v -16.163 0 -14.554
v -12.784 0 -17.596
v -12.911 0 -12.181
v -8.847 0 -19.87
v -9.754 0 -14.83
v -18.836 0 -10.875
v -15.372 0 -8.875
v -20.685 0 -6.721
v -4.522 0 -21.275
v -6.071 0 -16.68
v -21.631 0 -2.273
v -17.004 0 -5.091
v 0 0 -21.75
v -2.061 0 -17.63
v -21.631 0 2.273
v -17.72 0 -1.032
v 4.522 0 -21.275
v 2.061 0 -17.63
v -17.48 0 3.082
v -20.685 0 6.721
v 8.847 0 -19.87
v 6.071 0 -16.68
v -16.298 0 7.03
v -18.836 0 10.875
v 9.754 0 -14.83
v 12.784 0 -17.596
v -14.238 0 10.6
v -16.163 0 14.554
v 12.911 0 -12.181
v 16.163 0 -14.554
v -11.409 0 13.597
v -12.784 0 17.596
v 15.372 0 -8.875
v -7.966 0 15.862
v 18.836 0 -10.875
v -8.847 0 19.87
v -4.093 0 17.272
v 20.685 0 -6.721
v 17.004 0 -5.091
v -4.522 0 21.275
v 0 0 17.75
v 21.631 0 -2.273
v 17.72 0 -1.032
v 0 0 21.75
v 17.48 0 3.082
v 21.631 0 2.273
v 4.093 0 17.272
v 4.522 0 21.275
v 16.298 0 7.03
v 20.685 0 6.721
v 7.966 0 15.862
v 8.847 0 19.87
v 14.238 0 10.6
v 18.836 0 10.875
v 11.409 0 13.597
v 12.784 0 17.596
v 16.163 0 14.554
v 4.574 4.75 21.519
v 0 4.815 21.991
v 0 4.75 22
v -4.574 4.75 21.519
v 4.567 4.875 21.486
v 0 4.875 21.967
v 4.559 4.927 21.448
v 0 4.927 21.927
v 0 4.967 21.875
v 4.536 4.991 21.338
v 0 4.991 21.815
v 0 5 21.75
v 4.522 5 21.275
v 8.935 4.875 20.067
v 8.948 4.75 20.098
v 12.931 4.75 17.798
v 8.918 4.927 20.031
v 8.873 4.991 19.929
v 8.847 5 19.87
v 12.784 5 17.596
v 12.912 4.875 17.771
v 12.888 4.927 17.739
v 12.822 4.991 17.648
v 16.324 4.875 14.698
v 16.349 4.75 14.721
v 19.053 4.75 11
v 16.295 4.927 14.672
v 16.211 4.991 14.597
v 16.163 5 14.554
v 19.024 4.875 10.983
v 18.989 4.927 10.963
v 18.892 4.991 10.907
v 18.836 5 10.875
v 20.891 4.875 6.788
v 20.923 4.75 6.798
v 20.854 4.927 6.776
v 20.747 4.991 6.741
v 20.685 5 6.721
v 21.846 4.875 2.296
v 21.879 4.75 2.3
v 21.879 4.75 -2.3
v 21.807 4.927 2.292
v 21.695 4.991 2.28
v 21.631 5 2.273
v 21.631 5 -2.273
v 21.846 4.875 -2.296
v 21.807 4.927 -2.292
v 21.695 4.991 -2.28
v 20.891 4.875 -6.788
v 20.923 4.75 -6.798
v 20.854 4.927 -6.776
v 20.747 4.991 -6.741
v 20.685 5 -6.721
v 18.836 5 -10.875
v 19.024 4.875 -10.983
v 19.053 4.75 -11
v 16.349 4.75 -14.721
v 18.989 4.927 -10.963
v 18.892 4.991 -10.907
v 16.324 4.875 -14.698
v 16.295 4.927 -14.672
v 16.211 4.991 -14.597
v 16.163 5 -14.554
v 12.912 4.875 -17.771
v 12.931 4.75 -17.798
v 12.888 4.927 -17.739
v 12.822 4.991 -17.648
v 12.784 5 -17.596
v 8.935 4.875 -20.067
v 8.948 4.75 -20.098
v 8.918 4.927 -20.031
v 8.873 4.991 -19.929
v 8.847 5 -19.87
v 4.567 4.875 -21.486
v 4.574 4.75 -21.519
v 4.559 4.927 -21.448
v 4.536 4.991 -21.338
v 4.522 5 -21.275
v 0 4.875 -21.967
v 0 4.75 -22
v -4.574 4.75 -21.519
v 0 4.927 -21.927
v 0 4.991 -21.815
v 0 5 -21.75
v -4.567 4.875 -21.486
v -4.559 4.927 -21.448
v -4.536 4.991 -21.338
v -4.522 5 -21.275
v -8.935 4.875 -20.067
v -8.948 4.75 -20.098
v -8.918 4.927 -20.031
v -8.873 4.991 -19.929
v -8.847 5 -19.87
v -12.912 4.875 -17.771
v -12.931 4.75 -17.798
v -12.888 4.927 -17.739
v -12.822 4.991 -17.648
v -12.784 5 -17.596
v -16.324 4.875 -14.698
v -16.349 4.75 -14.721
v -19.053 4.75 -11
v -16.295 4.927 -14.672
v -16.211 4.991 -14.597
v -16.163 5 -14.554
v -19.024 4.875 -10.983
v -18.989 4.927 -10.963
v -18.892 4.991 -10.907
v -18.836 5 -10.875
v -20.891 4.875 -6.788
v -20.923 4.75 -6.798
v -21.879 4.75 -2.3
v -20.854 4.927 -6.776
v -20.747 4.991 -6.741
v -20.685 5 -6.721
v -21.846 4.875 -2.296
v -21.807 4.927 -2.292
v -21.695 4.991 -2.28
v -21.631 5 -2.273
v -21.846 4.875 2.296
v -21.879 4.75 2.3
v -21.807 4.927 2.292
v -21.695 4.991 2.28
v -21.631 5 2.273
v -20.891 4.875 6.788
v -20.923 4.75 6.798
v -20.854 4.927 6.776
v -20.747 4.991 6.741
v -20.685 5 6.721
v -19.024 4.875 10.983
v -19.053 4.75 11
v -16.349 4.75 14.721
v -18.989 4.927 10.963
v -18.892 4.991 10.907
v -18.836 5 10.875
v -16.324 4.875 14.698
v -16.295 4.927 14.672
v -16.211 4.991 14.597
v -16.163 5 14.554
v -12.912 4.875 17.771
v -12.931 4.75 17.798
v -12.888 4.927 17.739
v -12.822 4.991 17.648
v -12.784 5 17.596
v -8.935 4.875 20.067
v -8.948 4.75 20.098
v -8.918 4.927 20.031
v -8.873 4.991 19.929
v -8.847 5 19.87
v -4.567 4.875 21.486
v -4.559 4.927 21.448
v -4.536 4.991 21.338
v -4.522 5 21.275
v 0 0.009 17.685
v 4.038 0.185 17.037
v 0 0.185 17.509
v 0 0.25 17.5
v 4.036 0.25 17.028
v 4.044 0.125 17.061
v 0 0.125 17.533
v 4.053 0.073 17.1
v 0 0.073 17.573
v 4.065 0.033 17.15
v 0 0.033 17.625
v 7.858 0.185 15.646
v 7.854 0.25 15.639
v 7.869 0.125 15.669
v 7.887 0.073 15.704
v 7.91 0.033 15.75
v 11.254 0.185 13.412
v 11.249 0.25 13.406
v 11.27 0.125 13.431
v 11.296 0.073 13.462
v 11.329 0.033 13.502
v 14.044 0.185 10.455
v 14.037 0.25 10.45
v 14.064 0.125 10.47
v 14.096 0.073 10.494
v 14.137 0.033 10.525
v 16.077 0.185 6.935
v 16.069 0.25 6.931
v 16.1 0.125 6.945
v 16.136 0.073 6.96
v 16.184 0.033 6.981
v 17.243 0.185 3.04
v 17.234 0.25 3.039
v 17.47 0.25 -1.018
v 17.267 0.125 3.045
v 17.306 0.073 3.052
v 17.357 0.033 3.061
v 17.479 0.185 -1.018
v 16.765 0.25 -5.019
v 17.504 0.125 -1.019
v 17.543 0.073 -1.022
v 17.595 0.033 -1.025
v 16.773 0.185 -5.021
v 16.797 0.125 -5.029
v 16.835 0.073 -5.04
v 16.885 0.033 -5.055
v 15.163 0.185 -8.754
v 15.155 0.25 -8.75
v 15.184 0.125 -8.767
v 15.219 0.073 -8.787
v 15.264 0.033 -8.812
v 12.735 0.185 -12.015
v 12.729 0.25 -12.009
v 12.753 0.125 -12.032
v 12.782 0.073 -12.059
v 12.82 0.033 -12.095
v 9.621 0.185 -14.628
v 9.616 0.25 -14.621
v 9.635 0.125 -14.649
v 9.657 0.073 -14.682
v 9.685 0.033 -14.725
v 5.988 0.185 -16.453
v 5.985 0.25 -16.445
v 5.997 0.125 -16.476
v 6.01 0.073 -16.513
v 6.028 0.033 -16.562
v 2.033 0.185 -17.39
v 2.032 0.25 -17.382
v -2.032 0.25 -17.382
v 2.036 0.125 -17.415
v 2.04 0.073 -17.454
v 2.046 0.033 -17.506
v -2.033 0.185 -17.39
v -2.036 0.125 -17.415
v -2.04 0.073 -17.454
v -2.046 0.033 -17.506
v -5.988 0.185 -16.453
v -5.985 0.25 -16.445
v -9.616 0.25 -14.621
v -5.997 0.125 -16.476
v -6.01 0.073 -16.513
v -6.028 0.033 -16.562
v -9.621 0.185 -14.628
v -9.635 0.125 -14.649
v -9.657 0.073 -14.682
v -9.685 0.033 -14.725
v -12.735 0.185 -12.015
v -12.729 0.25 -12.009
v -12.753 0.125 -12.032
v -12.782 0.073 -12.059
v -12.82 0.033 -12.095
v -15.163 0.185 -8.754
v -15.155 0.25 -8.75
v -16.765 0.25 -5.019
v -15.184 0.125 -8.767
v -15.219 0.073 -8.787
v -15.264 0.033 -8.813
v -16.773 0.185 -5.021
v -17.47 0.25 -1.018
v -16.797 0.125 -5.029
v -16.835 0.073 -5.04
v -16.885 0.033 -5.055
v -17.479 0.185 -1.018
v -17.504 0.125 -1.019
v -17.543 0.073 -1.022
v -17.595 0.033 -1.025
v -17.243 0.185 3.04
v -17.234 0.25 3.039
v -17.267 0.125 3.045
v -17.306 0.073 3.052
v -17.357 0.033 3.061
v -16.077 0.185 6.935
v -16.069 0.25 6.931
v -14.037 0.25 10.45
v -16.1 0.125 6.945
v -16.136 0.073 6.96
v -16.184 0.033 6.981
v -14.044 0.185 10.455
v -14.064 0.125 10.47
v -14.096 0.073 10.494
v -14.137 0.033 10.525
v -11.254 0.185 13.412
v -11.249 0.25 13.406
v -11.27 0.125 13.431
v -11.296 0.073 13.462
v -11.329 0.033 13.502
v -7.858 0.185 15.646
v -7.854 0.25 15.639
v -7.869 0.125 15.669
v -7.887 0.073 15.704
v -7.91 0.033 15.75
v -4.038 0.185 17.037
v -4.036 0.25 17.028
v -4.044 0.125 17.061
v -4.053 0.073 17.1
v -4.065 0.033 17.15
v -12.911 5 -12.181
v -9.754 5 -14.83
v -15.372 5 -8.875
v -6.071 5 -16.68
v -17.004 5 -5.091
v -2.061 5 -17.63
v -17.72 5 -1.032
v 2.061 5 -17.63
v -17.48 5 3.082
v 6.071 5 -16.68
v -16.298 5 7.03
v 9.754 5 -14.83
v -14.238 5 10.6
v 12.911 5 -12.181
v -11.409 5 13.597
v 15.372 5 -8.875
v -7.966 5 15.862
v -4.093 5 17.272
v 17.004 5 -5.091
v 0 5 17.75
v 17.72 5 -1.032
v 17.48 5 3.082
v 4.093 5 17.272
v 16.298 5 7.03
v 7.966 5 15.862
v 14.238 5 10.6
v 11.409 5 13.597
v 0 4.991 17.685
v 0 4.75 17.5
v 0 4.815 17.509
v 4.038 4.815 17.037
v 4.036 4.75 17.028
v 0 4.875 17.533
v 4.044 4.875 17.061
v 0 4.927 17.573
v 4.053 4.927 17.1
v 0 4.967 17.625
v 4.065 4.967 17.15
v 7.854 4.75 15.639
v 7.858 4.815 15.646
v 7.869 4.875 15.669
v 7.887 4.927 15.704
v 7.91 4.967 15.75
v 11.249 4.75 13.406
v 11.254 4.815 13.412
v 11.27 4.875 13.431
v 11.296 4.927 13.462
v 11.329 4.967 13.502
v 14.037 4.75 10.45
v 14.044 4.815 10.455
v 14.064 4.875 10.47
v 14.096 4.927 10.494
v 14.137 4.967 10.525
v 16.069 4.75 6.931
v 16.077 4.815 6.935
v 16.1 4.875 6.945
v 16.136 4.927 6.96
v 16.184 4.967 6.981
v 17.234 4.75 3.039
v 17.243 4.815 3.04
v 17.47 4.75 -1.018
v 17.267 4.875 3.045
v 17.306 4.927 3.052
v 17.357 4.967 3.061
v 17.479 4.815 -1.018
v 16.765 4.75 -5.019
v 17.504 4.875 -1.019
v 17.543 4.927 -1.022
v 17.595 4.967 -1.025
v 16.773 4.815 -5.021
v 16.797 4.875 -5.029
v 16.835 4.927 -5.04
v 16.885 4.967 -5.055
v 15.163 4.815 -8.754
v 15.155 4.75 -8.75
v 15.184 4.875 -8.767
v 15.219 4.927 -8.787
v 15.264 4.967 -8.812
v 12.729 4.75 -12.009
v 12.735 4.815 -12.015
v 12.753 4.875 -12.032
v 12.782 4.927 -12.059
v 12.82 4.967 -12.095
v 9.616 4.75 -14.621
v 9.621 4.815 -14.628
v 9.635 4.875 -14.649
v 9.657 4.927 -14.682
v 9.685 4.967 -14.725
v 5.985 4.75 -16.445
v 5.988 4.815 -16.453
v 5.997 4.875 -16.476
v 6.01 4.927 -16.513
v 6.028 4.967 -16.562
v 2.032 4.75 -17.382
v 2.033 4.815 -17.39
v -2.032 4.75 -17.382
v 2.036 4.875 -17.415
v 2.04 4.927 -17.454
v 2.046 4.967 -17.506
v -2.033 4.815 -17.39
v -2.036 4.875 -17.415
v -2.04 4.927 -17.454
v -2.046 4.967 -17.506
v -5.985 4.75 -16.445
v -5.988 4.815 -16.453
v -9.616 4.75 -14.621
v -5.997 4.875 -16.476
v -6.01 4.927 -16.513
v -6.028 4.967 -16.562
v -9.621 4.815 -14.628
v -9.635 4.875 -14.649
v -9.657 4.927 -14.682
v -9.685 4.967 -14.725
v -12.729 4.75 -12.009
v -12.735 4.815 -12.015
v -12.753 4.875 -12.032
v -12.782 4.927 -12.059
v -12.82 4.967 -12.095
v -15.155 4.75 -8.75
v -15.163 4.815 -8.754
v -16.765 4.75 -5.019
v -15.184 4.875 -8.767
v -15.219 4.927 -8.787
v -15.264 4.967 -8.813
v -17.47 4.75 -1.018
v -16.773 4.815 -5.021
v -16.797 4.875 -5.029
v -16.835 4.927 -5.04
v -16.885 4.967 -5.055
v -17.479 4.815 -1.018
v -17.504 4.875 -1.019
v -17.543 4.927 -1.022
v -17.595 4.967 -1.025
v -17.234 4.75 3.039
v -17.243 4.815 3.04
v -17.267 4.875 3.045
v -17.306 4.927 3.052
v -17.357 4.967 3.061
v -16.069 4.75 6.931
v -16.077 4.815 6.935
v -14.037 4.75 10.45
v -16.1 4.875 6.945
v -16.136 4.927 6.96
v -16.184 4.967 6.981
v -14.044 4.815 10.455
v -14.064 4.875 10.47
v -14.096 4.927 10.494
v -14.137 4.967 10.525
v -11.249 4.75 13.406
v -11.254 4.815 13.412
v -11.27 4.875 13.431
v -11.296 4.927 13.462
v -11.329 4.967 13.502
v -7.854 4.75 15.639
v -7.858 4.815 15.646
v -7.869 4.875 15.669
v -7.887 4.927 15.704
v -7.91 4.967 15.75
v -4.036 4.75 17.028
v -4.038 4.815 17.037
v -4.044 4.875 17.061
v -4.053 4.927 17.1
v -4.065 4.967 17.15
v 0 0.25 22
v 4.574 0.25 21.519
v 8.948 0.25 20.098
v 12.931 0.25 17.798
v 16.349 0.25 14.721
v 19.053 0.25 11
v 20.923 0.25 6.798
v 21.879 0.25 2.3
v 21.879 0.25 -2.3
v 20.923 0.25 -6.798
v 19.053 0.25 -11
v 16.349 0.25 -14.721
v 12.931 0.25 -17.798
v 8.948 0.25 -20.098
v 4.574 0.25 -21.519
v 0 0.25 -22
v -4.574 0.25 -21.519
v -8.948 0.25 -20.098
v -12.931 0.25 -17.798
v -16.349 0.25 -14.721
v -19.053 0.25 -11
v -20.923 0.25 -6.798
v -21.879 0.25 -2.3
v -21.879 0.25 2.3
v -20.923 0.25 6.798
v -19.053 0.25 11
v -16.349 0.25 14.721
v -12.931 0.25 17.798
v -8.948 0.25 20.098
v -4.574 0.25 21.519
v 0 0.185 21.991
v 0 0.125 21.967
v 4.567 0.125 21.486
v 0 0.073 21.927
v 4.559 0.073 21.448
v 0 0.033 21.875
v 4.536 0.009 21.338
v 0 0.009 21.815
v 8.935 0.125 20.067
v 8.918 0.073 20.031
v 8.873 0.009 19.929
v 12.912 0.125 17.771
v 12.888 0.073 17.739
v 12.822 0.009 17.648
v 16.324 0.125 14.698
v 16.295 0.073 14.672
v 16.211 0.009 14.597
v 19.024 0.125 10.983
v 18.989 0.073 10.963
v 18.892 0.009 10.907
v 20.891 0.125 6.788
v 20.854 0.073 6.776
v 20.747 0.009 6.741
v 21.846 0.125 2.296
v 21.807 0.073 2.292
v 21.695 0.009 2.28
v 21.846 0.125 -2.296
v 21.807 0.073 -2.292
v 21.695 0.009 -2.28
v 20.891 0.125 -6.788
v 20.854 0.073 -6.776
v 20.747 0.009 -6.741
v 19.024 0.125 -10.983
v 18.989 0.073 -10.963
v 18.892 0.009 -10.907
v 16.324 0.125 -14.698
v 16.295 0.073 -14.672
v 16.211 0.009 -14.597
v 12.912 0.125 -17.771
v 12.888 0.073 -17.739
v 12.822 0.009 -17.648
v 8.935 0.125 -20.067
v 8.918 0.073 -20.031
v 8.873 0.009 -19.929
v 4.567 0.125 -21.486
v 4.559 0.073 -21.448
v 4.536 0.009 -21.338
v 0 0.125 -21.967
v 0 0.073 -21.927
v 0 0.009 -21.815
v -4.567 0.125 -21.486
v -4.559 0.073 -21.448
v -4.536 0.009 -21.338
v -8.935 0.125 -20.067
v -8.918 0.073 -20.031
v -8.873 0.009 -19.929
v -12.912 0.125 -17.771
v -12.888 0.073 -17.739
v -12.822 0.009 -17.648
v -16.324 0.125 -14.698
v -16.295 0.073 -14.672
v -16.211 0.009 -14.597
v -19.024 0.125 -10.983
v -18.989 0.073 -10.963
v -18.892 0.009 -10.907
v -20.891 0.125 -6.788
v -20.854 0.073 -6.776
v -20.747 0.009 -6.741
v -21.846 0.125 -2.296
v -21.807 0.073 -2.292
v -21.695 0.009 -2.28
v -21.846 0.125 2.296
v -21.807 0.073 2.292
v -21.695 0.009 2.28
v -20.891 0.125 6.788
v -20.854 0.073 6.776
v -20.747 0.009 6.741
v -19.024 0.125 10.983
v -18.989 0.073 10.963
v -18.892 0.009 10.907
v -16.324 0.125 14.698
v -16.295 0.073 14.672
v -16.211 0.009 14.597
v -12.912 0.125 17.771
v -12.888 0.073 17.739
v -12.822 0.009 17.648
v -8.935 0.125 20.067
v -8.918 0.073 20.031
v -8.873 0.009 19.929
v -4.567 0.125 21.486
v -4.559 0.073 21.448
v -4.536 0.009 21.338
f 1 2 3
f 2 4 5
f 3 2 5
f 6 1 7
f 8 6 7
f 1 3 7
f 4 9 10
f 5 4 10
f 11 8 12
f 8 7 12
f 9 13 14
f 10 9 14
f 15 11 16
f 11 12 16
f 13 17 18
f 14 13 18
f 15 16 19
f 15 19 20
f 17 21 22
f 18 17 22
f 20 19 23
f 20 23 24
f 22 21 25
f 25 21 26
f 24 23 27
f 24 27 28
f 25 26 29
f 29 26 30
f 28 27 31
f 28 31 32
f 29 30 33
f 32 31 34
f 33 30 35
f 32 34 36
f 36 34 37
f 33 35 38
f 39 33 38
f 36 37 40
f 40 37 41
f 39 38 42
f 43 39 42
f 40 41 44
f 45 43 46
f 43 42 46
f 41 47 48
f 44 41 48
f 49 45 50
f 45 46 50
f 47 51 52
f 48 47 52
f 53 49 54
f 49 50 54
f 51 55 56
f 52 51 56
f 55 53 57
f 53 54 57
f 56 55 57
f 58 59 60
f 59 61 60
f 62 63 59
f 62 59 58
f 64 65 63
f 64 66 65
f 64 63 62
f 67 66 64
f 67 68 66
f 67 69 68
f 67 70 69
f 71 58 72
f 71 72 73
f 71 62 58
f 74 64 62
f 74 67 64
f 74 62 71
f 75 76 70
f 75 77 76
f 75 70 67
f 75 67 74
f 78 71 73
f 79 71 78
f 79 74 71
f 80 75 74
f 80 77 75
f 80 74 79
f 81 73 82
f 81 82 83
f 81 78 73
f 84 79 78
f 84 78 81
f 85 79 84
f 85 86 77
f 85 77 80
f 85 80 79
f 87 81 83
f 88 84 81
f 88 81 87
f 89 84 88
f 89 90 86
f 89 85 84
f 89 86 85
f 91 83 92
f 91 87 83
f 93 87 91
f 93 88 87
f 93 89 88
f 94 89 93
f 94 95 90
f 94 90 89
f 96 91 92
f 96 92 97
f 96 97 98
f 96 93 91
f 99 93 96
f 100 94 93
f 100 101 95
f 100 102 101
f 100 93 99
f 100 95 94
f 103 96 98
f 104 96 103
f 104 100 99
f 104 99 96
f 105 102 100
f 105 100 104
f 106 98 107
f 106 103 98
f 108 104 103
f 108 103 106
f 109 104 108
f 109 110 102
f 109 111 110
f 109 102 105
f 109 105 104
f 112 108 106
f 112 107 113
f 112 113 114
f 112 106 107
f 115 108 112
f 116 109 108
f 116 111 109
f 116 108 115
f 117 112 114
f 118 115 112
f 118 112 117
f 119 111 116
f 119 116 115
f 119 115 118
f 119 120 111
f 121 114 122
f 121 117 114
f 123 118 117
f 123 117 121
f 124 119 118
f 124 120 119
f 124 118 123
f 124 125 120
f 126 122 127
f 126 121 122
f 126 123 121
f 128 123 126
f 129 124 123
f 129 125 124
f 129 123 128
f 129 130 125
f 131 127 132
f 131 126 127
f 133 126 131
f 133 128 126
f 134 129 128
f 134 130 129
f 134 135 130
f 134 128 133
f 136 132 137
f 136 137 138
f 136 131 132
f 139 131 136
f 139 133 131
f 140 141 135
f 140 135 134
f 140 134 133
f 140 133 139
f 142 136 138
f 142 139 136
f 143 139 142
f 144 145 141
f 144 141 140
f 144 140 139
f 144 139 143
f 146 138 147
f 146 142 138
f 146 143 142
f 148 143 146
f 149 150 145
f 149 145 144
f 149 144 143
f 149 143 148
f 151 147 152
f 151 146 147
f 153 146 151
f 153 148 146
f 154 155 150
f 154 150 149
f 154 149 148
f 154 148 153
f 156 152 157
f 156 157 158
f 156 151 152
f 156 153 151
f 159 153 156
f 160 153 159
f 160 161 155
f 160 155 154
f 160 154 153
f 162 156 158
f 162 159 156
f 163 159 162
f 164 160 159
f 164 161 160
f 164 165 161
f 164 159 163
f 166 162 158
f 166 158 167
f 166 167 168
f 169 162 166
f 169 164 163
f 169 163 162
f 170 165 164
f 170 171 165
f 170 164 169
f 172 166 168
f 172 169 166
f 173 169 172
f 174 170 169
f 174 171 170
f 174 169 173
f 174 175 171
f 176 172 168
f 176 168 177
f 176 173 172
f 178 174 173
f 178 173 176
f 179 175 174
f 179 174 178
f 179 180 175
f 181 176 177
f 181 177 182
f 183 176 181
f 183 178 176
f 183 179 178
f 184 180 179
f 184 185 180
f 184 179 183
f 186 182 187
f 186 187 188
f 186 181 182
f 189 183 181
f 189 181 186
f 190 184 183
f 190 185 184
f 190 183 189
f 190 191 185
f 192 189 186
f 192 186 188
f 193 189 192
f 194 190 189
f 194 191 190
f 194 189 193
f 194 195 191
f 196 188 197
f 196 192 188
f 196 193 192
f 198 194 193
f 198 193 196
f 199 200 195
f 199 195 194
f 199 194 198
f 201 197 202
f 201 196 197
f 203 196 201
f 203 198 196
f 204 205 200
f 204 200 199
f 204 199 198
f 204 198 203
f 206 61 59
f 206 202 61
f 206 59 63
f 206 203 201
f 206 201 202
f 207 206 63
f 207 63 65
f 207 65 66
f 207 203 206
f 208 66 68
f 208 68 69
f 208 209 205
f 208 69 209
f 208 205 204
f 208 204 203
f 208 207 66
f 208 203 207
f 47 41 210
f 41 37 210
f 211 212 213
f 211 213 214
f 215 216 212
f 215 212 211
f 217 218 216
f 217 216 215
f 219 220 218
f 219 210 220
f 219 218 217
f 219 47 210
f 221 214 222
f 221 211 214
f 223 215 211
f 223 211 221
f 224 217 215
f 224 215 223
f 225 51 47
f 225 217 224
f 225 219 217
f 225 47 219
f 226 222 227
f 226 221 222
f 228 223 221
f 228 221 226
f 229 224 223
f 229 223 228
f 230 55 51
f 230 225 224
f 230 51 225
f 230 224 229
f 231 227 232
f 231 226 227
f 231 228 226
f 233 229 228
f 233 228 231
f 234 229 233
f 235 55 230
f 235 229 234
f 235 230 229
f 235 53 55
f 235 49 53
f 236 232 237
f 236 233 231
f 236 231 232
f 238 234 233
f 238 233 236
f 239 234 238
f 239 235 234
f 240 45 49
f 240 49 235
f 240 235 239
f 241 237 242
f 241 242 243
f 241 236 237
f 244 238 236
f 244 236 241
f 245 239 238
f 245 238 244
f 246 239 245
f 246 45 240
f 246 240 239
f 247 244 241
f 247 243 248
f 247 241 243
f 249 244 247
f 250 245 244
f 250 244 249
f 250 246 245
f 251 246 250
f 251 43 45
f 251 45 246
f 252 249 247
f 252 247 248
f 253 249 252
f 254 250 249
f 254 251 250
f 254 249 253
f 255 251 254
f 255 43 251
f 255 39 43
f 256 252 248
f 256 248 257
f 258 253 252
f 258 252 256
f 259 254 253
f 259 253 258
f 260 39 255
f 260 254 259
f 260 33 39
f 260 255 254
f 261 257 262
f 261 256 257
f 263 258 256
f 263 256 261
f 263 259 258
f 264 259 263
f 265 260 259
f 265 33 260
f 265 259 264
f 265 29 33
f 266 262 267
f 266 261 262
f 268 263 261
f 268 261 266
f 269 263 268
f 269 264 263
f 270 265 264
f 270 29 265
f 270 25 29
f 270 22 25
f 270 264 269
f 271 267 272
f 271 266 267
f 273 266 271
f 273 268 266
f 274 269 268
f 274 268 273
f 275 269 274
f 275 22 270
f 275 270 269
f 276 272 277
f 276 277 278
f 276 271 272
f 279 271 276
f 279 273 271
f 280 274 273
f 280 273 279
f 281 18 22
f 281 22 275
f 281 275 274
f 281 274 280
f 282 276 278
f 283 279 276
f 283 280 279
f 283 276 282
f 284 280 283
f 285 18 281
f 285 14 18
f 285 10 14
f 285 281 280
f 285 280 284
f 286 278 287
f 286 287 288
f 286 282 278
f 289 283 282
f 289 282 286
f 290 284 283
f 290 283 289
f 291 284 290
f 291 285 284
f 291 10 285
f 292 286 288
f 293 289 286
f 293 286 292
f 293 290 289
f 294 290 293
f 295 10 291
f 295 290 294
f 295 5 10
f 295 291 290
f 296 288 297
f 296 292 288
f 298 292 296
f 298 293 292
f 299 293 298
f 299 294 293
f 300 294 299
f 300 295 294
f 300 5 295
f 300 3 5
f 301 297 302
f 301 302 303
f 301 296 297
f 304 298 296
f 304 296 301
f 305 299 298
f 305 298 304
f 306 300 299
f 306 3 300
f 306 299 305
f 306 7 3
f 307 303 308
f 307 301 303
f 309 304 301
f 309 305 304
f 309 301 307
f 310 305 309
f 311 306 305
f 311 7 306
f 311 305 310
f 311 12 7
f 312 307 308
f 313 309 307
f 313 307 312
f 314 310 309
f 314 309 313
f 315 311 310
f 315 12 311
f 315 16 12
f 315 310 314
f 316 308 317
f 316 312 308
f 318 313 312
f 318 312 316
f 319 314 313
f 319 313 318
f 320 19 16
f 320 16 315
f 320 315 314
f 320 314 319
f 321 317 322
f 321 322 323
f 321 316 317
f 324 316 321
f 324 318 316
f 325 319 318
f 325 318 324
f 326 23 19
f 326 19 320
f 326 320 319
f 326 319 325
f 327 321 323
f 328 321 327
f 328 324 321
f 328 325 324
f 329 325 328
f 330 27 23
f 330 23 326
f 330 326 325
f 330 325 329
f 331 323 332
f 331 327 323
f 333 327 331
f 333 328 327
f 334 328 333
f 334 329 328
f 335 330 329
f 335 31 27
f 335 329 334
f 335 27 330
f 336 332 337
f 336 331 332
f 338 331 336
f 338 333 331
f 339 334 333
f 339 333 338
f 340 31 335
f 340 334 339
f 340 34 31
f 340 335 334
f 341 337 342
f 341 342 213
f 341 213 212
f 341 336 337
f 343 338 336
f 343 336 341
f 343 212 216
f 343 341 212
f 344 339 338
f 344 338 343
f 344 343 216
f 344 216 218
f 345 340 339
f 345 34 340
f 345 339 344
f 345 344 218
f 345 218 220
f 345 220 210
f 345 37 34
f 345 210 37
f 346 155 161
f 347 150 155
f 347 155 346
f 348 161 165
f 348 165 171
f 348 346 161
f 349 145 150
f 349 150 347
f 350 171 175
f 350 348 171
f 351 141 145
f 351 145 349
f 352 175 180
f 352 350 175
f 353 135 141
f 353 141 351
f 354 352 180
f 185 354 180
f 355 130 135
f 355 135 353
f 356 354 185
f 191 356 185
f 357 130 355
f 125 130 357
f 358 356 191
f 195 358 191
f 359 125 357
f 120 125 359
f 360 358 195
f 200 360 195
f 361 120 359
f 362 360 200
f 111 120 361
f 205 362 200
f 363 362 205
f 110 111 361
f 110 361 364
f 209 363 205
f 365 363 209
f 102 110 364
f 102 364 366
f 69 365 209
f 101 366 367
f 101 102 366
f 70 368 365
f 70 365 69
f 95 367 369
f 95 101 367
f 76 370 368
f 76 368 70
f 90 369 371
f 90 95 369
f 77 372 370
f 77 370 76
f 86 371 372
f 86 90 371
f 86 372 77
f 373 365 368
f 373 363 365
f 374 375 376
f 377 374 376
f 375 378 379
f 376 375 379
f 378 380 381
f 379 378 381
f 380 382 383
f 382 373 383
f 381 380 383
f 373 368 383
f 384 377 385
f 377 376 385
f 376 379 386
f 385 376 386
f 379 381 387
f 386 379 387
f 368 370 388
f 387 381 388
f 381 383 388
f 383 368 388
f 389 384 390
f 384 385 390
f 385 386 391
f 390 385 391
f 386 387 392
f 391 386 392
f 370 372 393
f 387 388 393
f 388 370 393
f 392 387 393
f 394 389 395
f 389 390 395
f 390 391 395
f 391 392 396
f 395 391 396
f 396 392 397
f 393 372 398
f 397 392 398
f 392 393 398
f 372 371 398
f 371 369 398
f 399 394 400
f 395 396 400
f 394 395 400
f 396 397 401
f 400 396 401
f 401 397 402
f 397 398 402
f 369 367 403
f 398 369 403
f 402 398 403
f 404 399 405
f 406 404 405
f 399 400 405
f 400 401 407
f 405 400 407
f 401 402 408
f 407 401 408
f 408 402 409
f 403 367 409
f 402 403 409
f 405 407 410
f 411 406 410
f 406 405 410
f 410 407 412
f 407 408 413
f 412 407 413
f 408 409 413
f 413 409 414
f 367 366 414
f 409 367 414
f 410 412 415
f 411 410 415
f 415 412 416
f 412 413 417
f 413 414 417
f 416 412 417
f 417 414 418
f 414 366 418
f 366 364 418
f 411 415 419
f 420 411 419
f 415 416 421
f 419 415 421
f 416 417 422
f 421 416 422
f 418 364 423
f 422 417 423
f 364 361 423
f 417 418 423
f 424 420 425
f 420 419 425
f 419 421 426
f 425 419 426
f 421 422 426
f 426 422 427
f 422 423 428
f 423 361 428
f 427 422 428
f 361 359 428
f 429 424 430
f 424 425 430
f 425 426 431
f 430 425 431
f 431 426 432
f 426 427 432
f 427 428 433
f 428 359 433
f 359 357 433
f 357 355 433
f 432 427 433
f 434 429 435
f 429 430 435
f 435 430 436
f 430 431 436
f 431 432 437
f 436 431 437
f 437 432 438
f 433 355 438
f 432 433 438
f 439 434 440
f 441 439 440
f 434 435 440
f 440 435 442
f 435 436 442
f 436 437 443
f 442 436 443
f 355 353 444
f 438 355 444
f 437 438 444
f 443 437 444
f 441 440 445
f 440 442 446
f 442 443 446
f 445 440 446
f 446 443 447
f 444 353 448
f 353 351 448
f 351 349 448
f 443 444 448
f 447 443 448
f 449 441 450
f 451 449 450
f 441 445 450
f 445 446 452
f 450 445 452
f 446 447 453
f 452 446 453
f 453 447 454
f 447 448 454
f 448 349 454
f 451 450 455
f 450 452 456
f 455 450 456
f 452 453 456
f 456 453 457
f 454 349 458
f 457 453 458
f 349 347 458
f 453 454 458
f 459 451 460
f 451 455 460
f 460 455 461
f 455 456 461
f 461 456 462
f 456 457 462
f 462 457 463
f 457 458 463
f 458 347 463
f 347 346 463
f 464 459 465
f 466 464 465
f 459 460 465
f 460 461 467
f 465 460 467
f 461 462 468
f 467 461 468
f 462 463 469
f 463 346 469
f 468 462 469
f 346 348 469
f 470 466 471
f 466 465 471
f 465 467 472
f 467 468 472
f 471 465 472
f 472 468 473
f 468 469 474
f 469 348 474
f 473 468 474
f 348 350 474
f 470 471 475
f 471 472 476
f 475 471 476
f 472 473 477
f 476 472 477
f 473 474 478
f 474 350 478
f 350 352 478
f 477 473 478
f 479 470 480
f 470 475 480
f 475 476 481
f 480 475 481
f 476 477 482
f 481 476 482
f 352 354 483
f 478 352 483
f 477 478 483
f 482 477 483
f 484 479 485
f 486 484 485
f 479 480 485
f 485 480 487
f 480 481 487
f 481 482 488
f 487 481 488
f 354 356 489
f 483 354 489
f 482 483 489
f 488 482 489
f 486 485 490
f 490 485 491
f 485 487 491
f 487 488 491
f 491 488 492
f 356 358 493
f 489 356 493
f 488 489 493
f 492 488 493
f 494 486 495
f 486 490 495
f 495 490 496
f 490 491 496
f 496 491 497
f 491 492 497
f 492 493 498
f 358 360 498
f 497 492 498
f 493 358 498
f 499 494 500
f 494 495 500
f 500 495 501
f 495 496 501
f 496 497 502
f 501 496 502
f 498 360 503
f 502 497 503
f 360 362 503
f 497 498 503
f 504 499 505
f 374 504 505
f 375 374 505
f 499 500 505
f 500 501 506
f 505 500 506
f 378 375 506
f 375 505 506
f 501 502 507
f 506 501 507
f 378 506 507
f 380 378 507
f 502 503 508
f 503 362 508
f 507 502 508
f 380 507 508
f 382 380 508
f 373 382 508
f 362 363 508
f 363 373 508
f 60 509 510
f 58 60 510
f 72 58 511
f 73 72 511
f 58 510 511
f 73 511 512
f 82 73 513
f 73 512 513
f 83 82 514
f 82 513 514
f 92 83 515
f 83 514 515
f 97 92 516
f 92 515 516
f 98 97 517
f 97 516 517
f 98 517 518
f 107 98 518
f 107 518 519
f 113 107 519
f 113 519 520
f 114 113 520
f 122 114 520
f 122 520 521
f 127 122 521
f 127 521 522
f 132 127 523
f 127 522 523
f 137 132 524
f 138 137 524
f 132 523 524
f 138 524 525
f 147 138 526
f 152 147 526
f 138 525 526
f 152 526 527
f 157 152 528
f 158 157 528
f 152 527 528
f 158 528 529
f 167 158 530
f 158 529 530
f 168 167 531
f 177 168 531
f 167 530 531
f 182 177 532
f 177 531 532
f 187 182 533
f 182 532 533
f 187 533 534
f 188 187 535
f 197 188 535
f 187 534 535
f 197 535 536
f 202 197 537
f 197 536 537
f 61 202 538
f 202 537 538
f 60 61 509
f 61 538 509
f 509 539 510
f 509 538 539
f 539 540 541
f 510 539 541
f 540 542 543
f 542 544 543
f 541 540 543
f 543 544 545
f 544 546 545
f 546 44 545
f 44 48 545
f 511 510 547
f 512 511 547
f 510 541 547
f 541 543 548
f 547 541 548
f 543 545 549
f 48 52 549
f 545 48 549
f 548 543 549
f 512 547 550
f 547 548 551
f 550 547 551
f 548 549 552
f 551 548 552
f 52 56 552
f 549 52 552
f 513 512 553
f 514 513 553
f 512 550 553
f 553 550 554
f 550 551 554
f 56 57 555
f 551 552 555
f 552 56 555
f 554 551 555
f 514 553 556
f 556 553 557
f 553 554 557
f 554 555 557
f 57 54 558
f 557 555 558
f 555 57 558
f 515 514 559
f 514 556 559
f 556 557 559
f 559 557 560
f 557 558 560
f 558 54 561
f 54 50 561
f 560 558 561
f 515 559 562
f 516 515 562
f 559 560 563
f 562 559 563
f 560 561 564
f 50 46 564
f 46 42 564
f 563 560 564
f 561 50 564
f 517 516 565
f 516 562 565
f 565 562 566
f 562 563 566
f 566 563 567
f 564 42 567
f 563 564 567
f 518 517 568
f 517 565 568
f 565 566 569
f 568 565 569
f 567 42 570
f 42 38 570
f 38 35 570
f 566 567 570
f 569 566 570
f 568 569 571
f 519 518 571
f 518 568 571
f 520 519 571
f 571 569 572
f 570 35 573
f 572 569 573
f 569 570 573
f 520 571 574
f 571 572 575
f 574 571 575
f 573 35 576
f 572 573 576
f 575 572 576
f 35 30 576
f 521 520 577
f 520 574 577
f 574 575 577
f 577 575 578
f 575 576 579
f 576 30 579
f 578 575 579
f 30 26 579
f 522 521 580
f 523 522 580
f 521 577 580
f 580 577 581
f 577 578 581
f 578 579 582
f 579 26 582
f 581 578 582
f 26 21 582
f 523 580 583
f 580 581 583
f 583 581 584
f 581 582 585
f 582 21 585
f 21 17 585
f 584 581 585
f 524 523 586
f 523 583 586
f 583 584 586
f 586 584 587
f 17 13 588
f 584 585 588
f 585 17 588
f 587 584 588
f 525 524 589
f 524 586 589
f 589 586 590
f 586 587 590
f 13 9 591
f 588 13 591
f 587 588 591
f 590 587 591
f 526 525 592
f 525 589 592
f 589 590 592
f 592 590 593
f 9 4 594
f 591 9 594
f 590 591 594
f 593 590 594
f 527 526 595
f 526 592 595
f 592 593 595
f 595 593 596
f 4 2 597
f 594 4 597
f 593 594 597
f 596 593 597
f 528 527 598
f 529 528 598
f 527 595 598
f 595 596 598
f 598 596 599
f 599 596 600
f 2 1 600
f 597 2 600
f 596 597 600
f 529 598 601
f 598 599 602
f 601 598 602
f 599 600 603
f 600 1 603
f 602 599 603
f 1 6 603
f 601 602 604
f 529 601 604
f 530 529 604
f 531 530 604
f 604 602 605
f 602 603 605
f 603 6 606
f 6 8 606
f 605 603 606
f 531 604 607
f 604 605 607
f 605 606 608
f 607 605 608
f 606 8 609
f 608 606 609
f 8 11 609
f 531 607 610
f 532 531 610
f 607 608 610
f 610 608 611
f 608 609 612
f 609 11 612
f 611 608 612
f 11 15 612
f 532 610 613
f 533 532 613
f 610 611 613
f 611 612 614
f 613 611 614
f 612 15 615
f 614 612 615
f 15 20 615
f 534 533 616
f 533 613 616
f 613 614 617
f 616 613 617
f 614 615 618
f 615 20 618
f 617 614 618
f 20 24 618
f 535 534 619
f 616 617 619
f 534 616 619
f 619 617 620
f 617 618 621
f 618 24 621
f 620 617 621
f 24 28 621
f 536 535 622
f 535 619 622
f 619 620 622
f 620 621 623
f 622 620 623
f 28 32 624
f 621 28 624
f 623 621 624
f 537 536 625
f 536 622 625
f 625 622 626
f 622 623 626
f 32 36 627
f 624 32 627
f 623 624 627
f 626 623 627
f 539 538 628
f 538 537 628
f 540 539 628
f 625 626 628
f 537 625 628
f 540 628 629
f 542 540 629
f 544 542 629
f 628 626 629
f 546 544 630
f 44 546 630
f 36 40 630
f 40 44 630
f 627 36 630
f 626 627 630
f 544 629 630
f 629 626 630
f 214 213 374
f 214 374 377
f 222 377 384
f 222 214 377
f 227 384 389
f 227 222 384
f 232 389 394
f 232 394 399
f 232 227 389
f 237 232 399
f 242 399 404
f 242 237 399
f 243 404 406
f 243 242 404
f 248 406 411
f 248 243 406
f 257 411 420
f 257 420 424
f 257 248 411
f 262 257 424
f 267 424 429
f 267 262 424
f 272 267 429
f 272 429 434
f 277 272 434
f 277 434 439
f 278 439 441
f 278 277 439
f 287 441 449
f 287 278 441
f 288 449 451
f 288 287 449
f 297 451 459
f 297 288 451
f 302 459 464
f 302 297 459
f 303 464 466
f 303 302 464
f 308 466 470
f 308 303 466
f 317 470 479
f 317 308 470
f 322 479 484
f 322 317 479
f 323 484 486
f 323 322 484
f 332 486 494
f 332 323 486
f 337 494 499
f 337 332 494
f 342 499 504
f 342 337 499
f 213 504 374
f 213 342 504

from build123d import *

# Parameters (mm, degrees)
SKETCH_1_R      = 22
SKETCH_1_R_2    = 17.5
EXTRUDE_1_DEPTH = 5
FILLET_1_R      = 0.25


with BuildPart() as part:
    # 草图1 → 凸台-拉伸1 (new body)
    with BuildSketch(Plane(origin=(0, 0, 0), x_dir=(1, 0, 0), z_dir=(0, 1, 0))):
        with Locations(Location((0, 0, 0), (0, 0, 270))):
            Circle(SKETCH_1_R)
        with Locations(Location((0, 0, 0), (0, 0, 270))):
            Circle(SKETCH_1_R_2, mode=Mode.SUBTRACT)
    extrude(amount=EXTRUDE_1_DEPTH)

    # 圆角1
    fillet_1_edges = [part.edges().sort_by_distance(p)[0] for p in [
        (0, 0, -22),
        (0, 5, -22),
        (0, 0, -17.5),
        (0, 5, -17.5),
    ]]
    fillet(fillet_1_edges, radius=FILLET_1_R)


solid = part.part
